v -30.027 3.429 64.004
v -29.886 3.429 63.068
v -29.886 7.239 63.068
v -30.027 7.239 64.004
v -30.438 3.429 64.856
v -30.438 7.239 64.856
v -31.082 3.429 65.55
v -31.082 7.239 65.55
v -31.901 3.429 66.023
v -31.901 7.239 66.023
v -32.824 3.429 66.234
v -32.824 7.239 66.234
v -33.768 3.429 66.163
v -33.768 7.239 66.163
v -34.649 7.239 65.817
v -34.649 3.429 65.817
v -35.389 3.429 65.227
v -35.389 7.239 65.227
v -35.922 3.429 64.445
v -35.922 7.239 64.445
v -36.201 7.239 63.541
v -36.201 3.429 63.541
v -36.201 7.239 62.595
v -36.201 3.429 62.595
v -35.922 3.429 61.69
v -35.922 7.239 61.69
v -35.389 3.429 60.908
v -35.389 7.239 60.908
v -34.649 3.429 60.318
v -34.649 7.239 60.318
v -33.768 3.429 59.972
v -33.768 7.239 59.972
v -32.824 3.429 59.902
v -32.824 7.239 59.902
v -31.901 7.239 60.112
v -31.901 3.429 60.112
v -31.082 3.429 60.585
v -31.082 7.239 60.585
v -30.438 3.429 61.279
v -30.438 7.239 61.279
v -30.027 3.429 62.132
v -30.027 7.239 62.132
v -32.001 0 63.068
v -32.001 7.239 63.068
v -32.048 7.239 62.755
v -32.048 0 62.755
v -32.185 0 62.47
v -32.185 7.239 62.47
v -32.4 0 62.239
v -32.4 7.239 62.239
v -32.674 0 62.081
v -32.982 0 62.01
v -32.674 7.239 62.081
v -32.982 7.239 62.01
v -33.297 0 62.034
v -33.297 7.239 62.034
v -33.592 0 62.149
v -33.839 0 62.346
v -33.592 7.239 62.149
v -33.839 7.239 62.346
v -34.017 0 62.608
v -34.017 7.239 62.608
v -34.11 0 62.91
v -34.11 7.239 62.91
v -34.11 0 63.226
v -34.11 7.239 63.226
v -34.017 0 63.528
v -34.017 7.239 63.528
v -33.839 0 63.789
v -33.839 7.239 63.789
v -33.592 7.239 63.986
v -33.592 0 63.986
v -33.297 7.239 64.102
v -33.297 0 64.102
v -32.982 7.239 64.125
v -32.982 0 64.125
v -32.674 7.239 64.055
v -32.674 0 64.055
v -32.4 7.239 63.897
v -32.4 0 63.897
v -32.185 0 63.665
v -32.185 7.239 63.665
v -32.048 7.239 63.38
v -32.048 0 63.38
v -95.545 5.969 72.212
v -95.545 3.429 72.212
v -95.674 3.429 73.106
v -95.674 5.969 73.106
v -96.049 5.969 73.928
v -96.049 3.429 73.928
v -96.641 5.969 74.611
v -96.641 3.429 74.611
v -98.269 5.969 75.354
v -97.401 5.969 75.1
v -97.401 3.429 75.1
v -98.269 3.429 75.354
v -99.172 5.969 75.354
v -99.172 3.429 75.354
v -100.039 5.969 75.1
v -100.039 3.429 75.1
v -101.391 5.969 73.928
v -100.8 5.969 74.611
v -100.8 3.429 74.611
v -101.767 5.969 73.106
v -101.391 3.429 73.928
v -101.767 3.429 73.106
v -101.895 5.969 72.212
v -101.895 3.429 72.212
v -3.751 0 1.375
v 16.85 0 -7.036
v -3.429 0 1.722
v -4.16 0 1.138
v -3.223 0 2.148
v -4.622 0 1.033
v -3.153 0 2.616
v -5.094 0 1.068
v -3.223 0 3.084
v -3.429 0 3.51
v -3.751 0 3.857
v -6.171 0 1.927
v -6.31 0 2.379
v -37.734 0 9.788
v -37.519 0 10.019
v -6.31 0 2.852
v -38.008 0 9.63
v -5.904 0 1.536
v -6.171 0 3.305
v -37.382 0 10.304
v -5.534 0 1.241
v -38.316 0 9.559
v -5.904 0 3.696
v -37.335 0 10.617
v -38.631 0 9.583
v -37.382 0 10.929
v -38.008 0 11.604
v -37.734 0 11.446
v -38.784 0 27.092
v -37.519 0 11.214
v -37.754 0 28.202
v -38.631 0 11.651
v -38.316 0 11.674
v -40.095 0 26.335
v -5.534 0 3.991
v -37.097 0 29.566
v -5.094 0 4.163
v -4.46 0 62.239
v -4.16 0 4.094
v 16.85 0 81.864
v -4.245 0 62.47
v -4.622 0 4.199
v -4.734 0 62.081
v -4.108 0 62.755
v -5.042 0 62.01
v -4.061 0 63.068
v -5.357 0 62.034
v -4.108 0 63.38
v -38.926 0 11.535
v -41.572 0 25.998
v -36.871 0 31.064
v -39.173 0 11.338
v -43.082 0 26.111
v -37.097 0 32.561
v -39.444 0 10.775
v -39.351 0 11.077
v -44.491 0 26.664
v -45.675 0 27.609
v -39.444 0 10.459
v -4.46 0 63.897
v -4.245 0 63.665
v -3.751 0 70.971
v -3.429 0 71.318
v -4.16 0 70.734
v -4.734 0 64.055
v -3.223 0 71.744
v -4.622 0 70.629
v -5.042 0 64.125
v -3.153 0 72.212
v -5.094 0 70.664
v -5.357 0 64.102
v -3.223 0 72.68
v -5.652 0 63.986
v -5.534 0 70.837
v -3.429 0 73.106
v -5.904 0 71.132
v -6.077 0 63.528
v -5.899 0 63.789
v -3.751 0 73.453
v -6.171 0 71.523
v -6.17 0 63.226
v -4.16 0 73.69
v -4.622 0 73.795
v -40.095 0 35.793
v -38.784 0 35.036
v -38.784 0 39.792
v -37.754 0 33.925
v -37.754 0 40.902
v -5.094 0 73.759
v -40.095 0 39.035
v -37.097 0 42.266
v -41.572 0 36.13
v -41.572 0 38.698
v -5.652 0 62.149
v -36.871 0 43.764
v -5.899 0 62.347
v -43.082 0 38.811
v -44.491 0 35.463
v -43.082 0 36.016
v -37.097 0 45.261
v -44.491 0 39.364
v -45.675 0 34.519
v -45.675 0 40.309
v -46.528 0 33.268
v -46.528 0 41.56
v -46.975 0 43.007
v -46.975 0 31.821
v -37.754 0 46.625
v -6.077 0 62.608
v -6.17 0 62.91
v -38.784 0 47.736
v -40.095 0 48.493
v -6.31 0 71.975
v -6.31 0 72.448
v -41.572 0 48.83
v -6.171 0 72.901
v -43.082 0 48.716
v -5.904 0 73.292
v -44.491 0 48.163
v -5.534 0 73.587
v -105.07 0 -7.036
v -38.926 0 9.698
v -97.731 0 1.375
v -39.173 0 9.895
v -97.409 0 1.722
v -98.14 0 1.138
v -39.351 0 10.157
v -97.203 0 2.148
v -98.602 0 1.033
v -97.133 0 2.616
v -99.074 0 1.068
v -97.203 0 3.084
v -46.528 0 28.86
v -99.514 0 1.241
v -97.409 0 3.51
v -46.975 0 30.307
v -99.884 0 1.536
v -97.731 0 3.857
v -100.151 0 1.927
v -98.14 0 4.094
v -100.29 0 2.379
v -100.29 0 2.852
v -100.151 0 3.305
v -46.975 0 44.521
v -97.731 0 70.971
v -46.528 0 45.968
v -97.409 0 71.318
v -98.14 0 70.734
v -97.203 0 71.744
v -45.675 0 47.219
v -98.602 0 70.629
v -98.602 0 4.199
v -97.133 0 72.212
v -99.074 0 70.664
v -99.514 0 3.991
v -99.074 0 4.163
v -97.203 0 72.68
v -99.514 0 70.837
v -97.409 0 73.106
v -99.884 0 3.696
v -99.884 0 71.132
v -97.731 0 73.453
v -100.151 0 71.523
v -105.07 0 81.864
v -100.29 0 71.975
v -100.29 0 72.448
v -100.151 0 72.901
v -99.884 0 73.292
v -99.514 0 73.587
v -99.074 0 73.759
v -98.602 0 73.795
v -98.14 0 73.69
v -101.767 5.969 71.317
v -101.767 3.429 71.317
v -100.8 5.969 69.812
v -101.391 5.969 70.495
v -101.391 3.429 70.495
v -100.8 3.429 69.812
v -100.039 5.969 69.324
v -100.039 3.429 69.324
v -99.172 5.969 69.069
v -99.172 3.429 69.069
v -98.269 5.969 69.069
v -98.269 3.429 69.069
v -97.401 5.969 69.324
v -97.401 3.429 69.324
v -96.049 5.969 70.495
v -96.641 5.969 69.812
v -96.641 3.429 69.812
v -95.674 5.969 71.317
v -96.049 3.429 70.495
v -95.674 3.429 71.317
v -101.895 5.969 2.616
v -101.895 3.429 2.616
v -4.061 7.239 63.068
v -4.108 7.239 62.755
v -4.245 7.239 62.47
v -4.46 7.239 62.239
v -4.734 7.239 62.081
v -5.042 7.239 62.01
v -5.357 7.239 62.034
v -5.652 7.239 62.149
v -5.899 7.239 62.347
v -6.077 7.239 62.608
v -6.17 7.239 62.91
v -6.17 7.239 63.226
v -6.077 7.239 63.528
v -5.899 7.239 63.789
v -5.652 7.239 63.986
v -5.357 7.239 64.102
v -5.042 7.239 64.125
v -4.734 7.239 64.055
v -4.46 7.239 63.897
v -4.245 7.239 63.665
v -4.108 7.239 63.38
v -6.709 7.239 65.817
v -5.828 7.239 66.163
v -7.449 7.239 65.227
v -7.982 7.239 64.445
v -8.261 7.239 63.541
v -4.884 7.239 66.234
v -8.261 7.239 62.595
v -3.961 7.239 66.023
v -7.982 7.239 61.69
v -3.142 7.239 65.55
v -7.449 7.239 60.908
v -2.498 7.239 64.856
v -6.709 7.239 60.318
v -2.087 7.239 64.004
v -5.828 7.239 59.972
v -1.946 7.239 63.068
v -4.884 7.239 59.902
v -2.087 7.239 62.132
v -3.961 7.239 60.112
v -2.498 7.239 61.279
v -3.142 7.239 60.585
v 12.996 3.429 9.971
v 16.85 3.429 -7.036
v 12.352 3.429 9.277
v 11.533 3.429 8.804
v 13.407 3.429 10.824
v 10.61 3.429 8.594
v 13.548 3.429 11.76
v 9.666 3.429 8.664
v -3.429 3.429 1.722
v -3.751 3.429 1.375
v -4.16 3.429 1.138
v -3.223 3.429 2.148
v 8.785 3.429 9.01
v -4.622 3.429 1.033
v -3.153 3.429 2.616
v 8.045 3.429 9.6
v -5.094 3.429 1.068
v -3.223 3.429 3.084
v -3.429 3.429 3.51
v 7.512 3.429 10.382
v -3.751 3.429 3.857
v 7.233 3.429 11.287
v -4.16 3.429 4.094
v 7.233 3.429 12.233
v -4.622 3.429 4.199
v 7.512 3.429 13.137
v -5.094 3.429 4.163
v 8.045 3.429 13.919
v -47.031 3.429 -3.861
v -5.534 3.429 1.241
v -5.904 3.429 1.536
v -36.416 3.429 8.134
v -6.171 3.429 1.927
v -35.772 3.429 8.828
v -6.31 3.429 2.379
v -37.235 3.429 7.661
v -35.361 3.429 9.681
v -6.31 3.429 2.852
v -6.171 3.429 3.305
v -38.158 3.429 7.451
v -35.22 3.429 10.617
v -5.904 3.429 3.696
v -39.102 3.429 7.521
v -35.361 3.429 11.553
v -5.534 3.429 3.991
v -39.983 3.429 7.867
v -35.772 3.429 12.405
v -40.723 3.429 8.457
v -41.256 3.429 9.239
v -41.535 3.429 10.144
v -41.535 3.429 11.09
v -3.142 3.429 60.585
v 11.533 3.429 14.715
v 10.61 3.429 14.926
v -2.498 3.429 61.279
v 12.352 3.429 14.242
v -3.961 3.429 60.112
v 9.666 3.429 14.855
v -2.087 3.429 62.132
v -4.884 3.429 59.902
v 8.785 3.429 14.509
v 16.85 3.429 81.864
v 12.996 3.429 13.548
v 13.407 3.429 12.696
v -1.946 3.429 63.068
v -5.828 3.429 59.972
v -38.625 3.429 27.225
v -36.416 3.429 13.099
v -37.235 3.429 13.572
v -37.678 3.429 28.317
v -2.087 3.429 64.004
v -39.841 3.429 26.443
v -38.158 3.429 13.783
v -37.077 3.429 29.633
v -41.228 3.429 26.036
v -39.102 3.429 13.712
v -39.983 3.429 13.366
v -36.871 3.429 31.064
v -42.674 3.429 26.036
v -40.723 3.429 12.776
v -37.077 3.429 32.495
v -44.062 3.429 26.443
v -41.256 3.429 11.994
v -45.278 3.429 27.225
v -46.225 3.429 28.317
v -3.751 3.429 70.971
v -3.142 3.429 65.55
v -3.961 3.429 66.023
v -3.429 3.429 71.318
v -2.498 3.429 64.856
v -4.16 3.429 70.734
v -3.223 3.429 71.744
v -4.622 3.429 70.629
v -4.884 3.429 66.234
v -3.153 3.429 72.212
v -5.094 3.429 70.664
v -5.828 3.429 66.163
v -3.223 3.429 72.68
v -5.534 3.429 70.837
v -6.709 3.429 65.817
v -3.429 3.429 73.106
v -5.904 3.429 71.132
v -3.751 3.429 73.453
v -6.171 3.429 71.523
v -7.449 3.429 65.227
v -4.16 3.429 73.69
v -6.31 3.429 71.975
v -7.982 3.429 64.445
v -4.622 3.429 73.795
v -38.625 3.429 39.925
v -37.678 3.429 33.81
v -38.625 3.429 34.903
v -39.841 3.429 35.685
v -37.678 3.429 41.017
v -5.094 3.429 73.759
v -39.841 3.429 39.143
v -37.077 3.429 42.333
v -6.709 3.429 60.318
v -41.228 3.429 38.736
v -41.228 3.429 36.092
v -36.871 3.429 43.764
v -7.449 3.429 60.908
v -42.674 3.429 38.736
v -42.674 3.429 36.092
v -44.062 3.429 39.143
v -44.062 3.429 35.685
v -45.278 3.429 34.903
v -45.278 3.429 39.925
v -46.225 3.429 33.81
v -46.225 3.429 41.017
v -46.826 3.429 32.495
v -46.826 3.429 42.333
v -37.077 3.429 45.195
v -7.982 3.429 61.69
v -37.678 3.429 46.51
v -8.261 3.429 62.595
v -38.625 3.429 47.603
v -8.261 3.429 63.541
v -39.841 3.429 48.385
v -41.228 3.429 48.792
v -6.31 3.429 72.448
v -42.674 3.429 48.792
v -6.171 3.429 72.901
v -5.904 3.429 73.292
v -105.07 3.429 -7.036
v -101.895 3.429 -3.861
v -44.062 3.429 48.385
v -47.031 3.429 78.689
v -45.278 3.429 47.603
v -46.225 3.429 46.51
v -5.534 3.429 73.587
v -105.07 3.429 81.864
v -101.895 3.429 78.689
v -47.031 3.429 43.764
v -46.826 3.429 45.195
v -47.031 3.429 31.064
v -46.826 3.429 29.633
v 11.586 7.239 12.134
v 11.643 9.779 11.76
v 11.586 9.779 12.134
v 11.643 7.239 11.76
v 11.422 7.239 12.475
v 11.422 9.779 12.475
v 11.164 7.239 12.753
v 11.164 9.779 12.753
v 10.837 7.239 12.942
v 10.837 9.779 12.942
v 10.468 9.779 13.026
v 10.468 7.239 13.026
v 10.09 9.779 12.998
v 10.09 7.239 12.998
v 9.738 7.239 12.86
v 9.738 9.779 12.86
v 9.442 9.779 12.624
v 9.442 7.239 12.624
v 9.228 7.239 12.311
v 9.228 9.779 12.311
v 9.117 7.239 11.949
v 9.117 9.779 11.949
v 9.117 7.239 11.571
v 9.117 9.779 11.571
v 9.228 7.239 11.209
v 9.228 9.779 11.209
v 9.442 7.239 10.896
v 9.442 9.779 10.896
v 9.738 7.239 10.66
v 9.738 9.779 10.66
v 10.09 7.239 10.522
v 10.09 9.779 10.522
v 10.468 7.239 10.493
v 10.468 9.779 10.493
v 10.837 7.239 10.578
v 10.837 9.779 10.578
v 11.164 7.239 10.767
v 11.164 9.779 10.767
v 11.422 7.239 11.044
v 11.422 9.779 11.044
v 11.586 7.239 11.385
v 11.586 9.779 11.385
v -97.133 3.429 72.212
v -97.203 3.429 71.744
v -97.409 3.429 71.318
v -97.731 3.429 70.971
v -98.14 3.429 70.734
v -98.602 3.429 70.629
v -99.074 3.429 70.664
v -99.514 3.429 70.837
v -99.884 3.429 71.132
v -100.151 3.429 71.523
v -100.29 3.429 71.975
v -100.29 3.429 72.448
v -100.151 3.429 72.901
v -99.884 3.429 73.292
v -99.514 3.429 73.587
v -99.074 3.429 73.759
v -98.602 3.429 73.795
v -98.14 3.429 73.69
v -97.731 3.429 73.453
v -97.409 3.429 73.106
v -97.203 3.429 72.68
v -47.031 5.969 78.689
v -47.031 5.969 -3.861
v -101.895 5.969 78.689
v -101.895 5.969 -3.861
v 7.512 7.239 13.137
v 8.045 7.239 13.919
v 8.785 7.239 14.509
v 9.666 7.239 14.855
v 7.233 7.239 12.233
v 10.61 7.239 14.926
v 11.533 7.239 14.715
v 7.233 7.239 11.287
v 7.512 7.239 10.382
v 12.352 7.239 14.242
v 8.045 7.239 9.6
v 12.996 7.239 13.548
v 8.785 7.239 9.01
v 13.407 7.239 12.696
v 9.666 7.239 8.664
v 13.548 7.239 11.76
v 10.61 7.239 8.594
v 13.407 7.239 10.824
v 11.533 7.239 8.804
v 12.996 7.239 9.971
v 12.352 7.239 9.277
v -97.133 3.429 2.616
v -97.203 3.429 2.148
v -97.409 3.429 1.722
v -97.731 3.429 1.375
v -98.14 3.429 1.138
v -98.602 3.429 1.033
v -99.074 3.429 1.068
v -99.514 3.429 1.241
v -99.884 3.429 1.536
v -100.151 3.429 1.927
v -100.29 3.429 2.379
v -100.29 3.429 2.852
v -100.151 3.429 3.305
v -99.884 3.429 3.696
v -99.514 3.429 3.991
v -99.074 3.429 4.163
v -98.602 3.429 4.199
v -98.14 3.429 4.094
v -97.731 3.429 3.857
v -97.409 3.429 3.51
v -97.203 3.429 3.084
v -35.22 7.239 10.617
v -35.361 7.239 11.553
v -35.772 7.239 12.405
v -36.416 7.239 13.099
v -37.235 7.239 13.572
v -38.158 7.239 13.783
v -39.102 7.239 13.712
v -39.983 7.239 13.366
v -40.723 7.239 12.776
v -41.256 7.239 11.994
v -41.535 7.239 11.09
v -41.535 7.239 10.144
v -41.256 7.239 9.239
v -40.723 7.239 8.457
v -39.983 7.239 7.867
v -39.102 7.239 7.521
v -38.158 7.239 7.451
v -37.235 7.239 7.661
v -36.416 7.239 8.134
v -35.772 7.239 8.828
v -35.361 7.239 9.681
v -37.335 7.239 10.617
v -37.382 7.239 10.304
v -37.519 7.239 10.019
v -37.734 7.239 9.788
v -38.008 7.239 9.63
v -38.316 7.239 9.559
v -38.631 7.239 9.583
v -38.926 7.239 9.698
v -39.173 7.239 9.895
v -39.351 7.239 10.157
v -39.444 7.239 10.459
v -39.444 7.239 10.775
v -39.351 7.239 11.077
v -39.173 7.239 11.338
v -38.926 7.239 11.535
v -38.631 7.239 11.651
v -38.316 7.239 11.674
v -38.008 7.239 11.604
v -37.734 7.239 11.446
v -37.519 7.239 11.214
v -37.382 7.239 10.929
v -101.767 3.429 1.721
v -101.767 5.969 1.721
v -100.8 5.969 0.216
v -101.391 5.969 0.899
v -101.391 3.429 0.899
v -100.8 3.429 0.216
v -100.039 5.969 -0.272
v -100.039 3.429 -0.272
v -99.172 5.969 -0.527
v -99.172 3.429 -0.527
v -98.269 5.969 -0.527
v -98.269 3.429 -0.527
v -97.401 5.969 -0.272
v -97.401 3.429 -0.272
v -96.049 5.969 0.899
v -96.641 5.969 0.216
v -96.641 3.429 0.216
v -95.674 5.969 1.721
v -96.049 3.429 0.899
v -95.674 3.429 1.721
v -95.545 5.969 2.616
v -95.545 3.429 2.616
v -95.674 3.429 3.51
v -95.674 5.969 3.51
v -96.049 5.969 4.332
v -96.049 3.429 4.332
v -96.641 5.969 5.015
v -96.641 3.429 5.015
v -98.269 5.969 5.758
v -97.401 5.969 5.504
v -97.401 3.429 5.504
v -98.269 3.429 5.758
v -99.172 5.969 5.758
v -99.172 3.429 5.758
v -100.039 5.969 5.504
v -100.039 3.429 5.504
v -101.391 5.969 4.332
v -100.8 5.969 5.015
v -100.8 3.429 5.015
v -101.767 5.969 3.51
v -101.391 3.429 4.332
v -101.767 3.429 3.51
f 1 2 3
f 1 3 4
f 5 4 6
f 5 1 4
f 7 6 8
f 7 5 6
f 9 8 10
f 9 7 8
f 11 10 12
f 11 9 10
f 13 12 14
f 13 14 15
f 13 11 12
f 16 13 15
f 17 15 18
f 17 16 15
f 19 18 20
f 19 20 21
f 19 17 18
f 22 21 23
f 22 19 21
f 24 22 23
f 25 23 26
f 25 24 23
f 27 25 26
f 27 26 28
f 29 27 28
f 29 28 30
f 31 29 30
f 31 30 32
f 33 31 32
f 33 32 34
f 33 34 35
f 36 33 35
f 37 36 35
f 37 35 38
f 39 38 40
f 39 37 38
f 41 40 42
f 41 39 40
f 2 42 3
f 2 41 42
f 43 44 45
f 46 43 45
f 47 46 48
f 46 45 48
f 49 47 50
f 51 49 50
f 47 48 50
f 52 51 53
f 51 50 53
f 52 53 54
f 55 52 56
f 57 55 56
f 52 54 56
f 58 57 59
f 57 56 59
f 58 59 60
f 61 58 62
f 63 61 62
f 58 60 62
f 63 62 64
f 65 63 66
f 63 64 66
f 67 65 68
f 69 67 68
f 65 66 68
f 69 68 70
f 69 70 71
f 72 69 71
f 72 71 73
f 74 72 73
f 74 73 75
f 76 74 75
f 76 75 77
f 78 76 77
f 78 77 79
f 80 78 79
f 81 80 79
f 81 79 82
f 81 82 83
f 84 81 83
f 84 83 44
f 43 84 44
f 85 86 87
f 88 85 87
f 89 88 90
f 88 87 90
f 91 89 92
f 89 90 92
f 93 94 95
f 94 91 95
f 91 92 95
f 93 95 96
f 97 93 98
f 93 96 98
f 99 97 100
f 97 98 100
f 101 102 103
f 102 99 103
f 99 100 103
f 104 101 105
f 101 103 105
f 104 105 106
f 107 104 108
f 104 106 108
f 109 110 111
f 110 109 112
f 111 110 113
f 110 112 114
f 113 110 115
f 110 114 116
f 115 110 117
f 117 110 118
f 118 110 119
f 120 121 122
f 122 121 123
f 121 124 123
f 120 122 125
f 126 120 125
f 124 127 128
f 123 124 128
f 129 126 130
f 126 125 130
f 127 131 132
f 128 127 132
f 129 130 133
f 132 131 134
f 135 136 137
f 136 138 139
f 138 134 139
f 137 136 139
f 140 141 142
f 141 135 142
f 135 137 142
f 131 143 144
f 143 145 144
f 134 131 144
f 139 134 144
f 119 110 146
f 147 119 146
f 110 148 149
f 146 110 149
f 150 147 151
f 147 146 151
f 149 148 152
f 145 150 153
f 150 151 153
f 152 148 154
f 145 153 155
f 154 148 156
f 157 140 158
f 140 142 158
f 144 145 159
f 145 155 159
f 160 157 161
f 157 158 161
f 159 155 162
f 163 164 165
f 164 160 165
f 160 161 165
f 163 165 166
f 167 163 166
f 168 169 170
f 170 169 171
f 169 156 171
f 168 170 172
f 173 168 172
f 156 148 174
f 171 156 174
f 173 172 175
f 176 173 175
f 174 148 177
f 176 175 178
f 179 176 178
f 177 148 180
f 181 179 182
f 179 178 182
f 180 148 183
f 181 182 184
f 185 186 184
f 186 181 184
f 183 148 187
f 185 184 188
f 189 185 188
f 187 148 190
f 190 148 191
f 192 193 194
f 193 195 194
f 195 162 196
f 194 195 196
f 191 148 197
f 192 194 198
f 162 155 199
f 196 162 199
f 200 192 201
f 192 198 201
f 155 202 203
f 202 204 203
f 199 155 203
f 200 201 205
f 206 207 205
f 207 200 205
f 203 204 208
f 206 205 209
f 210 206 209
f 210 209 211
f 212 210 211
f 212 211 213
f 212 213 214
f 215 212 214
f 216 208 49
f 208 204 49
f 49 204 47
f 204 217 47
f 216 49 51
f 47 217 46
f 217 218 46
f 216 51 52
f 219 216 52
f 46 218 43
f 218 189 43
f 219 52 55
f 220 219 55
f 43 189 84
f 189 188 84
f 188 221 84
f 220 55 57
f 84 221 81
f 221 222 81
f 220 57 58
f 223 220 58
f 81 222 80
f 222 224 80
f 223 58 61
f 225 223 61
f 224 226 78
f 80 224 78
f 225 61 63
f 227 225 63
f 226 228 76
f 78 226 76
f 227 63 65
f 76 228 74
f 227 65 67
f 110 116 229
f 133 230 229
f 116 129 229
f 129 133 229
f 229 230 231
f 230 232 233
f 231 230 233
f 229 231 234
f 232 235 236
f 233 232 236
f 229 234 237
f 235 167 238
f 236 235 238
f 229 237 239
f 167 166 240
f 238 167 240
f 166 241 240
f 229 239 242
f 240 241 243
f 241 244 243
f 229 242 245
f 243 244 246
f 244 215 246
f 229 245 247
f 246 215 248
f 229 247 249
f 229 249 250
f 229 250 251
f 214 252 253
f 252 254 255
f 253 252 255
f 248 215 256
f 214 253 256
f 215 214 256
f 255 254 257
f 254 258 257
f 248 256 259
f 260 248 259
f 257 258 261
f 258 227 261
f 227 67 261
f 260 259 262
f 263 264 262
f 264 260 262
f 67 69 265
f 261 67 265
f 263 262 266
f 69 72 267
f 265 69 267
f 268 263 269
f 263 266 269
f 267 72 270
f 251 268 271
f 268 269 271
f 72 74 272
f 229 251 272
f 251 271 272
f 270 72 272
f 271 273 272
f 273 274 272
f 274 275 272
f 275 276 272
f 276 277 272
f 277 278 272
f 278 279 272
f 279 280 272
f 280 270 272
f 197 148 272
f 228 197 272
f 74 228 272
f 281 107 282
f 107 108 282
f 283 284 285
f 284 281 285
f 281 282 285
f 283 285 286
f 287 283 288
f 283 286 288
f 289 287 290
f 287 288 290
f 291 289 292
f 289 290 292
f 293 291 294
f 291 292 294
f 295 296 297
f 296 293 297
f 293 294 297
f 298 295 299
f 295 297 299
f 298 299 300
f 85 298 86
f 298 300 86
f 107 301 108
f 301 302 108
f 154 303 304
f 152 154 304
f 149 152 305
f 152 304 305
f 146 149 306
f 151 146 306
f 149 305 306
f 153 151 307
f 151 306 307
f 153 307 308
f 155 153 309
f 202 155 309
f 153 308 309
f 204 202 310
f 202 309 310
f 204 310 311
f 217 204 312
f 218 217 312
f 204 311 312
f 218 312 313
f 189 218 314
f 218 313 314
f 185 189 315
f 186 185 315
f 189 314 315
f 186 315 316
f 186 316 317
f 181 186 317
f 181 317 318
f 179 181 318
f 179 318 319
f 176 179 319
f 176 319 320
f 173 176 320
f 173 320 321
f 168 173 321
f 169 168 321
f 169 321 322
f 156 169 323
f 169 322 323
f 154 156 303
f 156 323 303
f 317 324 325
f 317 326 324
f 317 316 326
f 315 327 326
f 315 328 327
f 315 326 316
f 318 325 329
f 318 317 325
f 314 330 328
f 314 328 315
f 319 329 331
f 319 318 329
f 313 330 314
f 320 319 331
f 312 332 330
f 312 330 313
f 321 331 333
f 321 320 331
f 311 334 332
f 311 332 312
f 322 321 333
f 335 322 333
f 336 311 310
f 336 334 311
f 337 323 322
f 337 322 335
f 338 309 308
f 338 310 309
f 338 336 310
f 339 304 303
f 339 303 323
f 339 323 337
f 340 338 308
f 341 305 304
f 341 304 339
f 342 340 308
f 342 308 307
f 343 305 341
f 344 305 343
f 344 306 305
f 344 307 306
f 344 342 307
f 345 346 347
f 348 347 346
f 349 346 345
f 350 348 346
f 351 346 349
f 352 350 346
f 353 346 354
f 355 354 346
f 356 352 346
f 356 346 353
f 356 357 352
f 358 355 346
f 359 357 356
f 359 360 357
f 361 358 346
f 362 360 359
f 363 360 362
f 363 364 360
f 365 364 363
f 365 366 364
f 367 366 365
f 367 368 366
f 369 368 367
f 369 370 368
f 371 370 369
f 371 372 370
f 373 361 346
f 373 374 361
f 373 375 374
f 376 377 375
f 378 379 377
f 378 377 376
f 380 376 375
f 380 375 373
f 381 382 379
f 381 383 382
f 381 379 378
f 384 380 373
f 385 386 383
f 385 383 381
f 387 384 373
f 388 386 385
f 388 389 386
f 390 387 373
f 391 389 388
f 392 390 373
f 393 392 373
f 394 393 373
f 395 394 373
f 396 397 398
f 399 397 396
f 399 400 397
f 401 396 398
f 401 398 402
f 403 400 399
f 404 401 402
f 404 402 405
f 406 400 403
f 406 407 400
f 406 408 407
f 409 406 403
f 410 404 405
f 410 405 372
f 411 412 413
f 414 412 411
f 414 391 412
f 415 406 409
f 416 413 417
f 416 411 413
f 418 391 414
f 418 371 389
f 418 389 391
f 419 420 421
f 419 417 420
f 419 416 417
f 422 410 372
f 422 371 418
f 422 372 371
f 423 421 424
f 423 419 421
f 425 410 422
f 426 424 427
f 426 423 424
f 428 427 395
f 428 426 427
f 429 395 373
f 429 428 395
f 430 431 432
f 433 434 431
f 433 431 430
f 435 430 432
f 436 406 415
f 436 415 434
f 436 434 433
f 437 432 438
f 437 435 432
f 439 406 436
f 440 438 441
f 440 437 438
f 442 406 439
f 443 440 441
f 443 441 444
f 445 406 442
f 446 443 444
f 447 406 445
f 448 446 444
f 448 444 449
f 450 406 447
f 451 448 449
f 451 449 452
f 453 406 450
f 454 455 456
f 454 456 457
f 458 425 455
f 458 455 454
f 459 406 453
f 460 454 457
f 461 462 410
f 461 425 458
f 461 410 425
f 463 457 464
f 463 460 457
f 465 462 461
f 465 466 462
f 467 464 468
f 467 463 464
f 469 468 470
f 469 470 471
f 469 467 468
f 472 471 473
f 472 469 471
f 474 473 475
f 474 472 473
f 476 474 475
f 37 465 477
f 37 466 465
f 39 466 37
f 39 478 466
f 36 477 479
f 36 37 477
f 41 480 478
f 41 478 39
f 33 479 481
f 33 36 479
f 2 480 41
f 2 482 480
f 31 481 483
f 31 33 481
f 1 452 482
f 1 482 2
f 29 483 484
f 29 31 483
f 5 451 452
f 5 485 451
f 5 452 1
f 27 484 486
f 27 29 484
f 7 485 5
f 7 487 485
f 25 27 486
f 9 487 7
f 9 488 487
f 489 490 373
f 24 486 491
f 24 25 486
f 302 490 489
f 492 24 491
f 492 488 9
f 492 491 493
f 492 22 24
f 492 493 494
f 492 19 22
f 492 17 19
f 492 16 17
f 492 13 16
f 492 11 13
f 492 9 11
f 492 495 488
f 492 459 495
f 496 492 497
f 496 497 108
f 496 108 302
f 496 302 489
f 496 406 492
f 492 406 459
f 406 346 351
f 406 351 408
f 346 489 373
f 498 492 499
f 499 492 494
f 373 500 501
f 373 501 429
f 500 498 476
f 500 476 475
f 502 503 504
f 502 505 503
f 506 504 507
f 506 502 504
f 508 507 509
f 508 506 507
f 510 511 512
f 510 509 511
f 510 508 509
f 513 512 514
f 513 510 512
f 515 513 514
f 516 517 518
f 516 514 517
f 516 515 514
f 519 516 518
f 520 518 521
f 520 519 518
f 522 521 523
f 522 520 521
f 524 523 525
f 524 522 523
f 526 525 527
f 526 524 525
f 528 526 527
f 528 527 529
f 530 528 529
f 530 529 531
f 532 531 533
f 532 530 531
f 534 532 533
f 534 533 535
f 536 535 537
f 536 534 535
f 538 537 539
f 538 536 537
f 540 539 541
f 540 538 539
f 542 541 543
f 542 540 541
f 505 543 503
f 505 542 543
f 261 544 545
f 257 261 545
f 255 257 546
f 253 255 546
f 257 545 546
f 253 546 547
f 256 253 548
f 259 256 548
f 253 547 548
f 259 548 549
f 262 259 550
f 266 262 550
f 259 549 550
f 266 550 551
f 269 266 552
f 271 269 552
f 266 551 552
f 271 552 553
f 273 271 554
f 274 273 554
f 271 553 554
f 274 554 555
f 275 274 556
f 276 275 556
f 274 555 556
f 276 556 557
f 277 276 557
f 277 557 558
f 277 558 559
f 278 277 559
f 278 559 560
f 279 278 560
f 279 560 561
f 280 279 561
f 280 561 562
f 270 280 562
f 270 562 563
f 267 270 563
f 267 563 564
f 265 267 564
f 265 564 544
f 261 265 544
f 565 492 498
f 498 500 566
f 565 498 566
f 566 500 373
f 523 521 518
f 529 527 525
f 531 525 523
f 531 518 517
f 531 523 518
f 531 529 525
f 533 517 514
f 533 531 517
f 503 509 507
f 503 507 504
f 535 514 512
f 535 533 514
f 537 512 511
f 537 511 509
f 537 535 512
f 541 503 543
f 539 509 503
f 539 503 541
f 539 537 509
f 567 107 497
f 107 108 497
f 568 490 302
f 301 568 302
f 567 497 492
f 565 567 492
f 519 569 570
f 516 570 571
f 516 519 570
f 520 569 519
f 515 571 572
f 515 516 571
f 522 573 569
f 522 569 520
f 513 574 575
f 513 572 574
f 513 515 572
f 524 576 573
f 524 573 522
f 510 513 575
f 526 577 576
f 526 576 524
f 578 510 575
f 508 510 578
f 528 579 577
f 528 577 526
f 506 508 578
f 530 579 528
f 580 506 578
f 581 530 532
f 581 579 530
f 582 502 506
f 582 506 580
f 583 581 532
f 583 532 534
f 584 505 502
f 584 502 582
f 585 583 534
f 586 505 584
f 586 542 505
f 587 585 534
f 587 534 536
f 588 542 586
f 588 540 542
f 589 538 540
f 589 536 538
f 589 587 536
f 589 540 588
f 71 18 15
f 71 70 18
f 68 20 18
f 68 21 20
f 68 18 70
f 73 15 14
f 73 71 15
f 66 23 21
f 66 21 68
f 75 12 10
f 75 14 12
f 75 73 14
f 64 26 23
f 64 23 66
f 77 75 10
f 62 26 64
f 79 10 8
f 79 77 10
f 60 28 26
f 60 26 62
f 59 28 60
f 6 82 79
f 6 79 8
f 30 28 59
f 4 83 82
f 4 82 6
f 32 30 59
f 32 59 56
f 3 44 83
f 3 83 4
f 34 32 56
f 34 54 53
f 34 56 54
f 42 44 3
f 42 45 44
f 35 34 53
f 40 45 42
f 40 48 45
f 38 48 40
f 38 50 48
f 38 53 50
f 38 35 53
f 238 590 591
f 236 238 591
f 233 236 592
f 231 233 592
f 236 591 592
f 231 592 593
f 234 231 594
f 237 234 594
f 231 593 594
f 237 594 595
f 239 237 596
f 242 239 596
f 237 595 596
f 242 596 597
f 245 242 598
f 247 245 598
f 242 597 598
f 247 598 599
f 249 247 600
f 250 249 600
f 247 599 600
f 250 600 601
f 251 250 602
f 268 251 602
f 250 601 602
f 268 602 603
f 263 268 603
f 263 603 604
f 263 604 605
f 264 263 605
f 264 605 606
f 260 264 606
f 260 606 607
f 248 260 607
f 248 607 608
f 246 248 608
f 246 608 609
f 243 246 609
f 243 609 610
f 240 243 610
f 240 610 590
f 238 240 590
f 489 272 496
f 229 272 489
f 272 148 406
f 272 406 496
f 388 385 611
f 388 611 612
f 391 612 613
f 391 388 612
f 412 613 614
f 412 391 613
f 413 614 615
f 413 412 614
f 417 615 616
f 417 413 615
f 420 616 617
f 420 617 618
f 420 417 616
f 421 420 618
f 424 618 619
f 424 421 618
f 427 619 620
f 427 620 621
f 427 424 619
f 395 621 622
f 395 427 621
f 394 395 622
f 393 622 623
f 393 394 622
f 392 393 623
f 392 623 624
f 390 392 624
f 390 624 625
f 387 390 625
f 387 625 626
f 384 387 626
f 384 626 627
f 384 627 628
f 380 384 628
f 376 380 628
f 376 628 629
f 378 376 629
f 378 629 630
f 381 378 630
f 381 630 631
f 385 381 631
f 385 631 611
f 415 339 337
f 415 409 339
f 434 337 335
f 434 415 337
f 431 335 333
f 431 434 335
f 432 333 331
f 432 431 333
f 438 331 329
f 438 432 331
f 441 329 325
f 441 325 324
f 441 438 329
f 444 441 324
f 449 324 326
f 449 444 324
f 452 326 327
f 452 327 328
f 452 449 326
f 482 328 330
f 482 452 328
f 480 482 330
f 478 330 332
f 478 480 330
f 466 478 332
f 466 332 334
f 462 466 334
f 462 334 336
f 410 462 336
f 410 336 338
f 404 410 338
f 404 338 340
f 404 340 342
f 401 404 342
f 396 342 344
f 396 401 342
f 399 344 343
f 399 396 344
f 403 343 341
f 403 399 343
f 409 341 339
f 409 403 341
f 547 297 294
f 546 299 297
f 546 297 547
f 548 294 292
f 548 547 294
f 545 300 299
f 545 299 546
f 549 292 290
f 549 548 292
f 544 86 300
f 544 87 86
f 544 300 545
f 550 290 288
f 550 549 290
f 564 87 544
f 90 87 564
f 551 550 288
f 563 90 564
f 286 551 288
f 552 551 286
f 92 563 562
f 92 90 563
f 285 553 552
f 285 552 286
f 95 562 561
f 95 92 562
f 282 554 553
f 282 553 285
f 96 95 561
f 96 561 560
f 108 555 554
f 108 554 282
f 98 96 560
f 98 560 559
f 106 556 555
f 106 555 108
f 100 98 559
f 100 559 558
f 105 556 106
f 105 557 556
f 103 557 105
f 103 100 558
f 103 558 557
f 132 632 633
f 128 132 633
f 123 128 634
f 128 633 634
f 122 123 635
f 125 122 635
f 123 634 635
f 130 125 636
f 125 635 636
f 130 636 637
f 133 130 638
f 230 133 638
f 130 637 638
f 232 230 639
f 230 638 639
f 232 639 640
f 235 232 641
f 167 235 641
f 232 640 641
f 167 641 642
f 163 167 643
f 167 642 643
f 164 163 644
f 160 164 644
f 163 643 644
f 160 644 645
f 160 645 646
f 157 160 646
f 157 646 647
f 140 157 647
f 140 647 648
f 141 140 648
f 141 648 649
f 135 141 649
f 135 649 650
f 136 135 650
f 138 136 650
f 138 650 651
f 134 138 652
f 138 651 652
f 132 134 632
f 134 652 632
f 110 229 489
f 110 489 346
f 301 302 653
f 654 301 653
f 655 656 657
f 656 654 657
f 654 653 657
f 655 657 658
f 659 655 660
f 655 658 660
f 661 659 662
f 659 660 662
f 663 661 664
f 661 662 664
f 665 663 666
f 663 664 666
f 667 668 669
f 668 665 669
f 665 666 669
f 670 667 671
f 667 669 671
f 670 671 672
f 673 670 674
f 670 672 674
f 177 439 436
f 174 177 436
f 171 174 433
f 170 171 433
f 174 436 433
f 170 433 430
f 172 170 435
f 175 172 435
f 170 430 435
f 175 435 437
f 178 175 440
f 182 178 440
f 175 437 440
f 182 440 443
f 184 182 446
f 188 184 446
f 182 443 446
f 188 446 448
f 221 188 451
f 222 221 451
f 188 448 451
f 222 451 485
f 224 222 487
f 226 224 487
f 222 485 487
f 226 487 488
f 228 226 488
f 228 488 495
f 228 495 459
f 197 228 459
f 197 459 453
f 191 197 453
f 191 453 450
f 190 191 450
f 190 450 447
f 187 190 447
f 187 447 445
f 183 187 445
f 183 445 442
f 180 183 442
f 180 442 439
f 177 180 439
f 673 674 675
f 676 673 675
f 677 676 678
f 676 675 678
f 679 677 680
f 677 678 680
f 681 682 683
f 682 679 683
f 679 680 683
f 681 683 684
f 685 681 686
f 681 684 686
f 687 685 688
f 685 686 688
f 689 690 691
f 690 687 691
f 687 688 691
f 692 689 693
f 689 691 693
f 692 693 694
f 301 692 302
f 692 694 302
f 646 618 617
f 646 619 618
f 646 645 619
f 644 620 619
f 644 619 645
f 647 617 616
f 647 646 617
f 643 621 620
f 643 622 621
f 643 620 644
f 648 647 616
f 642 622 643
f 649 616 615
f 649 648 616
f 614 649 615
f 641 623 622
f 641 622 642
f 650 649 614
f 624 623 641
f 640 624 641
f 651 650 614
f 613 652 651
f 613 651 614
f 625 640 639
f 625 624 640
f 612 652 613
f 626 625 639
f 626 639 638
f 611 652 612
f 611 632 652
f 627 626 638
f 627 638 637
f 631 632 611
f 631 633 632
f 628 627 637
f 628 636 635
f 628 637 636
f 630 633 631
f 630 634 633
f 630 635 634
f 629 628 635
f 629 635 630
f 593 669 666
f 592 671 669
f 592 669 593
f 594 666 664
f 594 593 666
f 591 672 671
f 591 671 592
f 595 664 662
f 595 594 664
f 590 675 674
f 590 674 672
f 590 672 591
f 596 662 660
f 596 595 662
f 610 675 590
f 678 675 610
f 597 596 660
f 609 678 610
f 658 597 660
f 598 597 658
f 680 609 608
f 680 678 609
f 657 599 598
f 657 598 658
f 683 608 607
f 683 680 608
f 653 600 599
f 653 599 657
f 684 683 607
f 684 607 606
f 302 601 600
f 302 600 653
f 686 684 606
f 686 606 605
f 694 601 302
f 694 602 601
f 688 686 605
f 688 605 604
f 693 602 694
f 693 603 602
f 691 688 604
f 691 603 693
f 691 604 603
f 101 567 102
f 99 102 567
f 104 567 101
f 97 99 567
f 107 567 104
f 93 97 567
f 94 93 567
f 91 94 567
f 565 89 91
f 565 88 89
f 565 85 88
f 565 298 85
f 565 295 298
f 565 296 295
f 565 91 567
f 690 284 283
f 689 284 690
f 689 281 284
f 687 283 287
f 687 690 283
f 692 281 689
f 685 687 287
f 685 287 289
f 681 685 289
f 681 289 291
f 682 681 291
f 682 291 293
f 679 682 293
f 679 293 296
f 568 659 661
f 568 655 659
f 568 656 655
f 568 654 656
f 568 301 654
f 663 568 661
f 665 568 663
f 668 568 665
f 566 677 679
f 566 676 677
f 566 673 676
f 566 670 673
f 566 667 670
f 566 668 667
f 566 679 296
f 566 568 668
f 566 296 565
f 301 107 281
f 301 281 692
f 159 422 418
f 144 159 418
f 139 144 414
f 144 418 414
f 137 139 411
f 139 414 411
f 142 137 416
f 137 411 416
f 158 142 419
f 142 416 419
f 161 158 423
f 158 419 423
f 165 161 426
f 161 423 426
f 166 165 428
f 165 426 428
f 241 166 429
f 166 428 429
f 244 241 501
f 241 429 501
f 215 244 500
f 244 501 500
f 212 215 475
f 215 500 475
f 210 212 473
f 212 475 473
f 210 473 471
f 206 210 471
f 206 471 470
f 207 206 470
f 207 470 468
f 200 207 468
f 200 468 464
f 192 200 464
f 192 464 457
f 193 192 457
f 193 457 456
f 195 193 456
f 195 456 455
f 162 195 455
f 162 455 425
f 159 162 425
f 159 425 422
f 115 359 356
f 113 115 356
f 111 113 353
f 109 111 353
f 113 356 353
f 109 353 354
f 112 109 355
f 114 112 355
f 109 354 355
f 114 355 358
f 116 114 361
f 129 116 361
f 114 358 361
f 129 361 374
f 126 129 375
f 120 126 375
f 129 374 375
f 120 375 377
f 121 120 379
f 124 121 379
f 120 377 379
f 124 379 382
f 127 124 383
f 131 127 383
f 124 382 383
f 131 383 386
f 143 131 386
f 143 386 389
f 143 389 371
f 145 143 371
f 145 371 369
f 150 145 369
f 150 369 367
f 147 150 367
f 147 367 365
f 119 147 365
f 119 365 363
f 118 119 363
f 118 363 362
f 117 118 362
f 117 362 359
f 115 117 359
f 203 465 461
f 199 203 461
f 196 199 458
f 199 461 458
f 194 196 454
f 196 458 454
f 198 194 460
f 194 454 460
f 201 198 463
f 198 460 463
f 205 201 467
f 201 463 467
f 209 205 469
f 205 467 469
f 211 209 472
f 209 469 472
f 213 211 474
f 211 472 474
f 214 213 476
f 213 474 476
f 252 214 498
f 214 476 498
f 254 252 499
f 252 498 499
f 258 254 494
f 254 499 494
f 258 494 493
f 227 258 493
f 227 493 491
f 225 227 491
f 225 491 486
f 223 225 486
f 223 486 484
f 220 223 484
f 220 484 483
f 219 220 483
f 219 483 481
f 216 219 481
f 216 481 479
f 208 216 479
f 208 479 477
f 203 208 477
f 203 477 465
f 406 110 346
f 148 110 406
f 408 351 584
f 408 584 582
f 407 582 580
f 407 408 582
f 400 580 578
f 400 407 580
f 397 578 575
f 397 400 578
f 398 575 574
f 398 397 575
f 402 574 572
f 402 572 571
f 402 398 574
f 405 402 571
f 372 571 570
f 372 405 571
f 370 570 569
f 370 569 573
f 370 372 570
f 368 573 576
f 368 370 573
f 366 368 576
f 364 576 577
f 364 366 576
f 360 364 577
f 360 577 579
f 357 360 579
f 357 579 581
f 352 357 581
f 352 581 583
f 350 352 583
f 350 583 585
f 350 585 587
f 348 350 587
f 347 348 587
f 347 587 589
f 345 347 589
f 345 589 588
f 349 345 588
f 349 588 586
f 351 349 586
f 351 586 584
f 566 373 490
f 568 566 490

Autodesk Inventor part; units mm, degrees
ref_plane "YZ Plane" through (0, 0, 0) normal (1, 0, 0) x (0, 1, 0)
ref_plane "XZ Plane" through (0, 0, 0) normal (0, 1, 0) x (-1, 0, 0)
ref_plane "XY Plane" through (0, 0, 0) normal (0, 0, 1) x (1, 0, 0)
sketch "Sketch1" plane through (0, 0, 0) normal (0, 1, 0) x (-1, 0, 0)
  line L0 (-16.8496, 81.8638) -> (105.0704, 81.8638)
  line L1 (105.0704, 81.8638) -> (105.0704, -7.0362)
  line L2 (105.0704, -7.0362) -> (-16.8496, -7.0362)
  line L3 (-16.8496, -7.0362) -> (-16.8496, 81.8638)
  point P0 (0, 0)
  dimension "d0" = 121.92
  dimension "d1" = 88.9
extrude "Extrusion1" add sketch "Sketch1" along normal blind 3.429
sketch "Sketch2" plane through (0, 3.429, 0) normal (0, 1, 0) x (1, 0, 0)
  line L0 (-105.0704, -81.8638) -> (16.8496, -81.8638) projected
  line L1 (16.8496, 7.0362) -> (-105.0704, 7.0362) projected
  line L2 (-105.0704, 7.0362) -> (-105.0704, -81.8638) projected
  circle A0 centre (-98.7204, -2.6158) radius 1.5875
  circle A1 centre (-98.7204, -72.2118) radius 1.5875
  circle A2 centre (-4.7404, -2.6158) radius 1.5875
  circle A3 centre (-4.7404, -72.2118) radius 1.5875
  point P0 (0, 0)
  dimension "d4" = 121.92
  dimension "d5" = 88.9
  dimension "d6" = 6.35
  dimension "d8" = 6.35
  dimension "d12" = 3.175
  dimension "d13" = 3.175
  dimension "d15" = 3.175
  dimension "d18" = 93.98
  dimension "d20" = 69.596
  dimension "d21" = 9.652
  dimension "d22" = 9.652
  dimension "d23" = 3.175
  dimension "d64" = 9.652
  dimension "d65" = 9.652
extrude "Extrusion3" cut sketch "Sketch2" against normal through all
sketch "Sketch4" plane through (0, 3.429, 0) normal (0, 1, 0) x (1, 0, 0)
  circle A0 centre (-98.7204, -2.6158) radius 1.5875 projected
  circle A1 centre (-98.7204, -72.2118) radius 1.5875 projected
  line L0 (16.8496, 7.0362) -> (-105.0704, 7.0362) projected
  line L1 (-105.0704, 7.0362) -> (-105.0704, -81.8638) projected
  line L2 (-101.8954, -78.6888) -> (-47.0314, -78.6888)
  line L3 (-47.0314, -78.6888) -> (-47.0314, 3.8612)
  line L4 (-47.0314, 3.8612) -> (-101.8954, 3.8612)
  line L5 (-101.8954, 3.8612) -> (-101.8954, -78.6888)
  circle A2 centre (-98.7204, -2.6158) radius 3.175
  circle A3 centre (-98.7204, -72.2118) radius 3.175
  point P0 (0, 0)
  dimension "d26" = 54.864
  dimension "d27" = 82.55
  dimension "d28" = 3.175
  dimension "d29" = 3.175
  dimension "d38" = 3.175
extrude "Extrusion4" add sketch "Sketch4" along normal blind 2.54 contours L5 L4 L3 L2
sketch "Sketch5" plane through (0, 3.429, 0) normal (0, 1, 0) x (1, 0, 0)
  line L0 (-47.0314, 3.8612) -> (-47.0314, -78.6888) projected
  line L1 (-47.0314, -37.4138) -> (-47.0314, -31.0638)
  line L2 (-47.0314, -31.0638) -> (-47.0314, -43.7638)
  line L3 (-47.0314, -43.7638) -> (-41.9514, -43.7638)
  circle A0 centre (-41.9514, -43.7638) radius 5.08
  circle A1 centre (-41.9514, -31.0638) radius 5.08
  point P0 (0, 0)
  dimension "d35" = 6.35
  dimension "d36" = 12.7
  dimension "d37" = 5.08
extrude "Extrusion5" cut sketch "Sketch5" against normal through all
sketch "Sketch6" plane through (0, 3.429, 0) normal (0, 1, 0) x (1, 0, 0)
  line L0 (-47.0314, -31.0638) -> (-47.0314, -43.7638) projected
  line L1 (-105.0704, 7.0362) -> (-105.0704, -81.8638) projected
  line L2 (-47.0314, -37.4138) -> (-40.6814, -37.4138)
  line L3 (-40.6814, -37.4138) -> (-40.6814, -65.3538)
  line L4 (-40.6814, -65.3538) -> (-40.6814, 3.1754)
  line L5 (-40.6814, 3.1754) -> (12.6586, 3.1754)
  line L6 (12.6586, 3.1754) -> (12.6586, -65.3538)
  line L7 (12.6586, -65.3538) -> (-40.6814, -65.3538)
  line L8 (-40.6814, -65.3538) -> (-40.6814, -63.0678)
  line L9 (-40.6814, -63.0678) -> (12.6586, -63.0678)
  line L10 (-40.6814, -63.0678) -> (-33.0614, -63.0678)
  line L11 (-33.0614, -63.0678) -> (-5.1214, -63.0678)
  circle A0 centre (-33.0614, -63.0678) radius 3.175
  circle A1 centre (-5.1214, -63.0678) radius 3.175
  line L12 (-40.6814, 3.1754) -> (-38.3954, 3.1754)
  line L13 (-38.3954, 3.1754) -> (-38.3954, -65.3538)
  line L14 (-38.3954, 3.1754) -> (-38.3954, -10.6168)
  circle A2 centre (-38.3954, -10.6168) radius 3.175
  line L15 (10.3726, 3.1754) -> (10.3726, -11.7598)
  circle A3 centre (10.3726, -11.7598) radius 3.175
  point P0 (0, 0)
  dimension "d39" = 6.35
  dimension "d40" = 27.94
  dimension "d41" = 68.5292
  dimension "d42" = 53.34
  dimension "d43" = 2.286
  dimension "d44" = 7.62
  dimension "d45" = 27.94
  dimension "d46" = 6.35
  dimension "d47" = 6.35
  dimension "d48" = 2.286
  dimension "d49" = 13.7922
  dimension "d50" = 6.35
  dimension "d51" = 14.9352
  dimension "d52" = 2.286
  dimension "d53" = 6.35
extrude "Extrusion6" add sketch "Sketch6" along normal blind 3.81 contours A2 L4 | L4 A2 L13 | L13 A2 | A0 L9 | L9 A0 L7 | L7 A0 | A1 L9 | L9 A1 L7 | L7 A1 | A3 L6 | A3 L6
sketch "Sketch7" plane through (-38.3954, 7.239, 10.6168) normal (0, 1, 0) x (1, 0, 0)
  circle A0 centre (48.768, -1.143) radius 3.175 projected
  circle A1 centre (33.274, -52.451) radius 3.175 projected
  circle A2 centre (5.334, -52.451) radius 3.175 projected
  circle A3 centre (48.768, -1.143) radius 1.27
  point P0 (38.3954, 10.6168)
  dimension "d56" = 2.54
extrude "Extrusion7" add sketch "Sketch7" along normal blind 2.54 contours A3
sketch "Sketch8" plane through (-38.3954, 7.239, 10.6168) normal (0, 1, 0) x (1, 0, 0)
  circle A0 centre (0, 0) radius 3.175 projected
  circle A1 centre (5.334, -52.451) radius 3.175 projected
  circle A2 centre (33.274, -52.451) radius 3.175 projected
  circle A3 centre (0, 0) radius 1.0605
  circle A4 centre (5.334, -52.451) radius 1.0605
  circle A5 centre (33.274, -52.451) radius 1.0604
  point P0 (38.3954, 10.6168)
  dimension "d59" = 2.1209
  dimension "d60" = 2.1209
  dimension "d61" = 2.1209
extrude "Extrusion8" cut sketch "Sketch8" against normal through all contours A3 | A4 | A5
properties part number "base_plate_r2"
